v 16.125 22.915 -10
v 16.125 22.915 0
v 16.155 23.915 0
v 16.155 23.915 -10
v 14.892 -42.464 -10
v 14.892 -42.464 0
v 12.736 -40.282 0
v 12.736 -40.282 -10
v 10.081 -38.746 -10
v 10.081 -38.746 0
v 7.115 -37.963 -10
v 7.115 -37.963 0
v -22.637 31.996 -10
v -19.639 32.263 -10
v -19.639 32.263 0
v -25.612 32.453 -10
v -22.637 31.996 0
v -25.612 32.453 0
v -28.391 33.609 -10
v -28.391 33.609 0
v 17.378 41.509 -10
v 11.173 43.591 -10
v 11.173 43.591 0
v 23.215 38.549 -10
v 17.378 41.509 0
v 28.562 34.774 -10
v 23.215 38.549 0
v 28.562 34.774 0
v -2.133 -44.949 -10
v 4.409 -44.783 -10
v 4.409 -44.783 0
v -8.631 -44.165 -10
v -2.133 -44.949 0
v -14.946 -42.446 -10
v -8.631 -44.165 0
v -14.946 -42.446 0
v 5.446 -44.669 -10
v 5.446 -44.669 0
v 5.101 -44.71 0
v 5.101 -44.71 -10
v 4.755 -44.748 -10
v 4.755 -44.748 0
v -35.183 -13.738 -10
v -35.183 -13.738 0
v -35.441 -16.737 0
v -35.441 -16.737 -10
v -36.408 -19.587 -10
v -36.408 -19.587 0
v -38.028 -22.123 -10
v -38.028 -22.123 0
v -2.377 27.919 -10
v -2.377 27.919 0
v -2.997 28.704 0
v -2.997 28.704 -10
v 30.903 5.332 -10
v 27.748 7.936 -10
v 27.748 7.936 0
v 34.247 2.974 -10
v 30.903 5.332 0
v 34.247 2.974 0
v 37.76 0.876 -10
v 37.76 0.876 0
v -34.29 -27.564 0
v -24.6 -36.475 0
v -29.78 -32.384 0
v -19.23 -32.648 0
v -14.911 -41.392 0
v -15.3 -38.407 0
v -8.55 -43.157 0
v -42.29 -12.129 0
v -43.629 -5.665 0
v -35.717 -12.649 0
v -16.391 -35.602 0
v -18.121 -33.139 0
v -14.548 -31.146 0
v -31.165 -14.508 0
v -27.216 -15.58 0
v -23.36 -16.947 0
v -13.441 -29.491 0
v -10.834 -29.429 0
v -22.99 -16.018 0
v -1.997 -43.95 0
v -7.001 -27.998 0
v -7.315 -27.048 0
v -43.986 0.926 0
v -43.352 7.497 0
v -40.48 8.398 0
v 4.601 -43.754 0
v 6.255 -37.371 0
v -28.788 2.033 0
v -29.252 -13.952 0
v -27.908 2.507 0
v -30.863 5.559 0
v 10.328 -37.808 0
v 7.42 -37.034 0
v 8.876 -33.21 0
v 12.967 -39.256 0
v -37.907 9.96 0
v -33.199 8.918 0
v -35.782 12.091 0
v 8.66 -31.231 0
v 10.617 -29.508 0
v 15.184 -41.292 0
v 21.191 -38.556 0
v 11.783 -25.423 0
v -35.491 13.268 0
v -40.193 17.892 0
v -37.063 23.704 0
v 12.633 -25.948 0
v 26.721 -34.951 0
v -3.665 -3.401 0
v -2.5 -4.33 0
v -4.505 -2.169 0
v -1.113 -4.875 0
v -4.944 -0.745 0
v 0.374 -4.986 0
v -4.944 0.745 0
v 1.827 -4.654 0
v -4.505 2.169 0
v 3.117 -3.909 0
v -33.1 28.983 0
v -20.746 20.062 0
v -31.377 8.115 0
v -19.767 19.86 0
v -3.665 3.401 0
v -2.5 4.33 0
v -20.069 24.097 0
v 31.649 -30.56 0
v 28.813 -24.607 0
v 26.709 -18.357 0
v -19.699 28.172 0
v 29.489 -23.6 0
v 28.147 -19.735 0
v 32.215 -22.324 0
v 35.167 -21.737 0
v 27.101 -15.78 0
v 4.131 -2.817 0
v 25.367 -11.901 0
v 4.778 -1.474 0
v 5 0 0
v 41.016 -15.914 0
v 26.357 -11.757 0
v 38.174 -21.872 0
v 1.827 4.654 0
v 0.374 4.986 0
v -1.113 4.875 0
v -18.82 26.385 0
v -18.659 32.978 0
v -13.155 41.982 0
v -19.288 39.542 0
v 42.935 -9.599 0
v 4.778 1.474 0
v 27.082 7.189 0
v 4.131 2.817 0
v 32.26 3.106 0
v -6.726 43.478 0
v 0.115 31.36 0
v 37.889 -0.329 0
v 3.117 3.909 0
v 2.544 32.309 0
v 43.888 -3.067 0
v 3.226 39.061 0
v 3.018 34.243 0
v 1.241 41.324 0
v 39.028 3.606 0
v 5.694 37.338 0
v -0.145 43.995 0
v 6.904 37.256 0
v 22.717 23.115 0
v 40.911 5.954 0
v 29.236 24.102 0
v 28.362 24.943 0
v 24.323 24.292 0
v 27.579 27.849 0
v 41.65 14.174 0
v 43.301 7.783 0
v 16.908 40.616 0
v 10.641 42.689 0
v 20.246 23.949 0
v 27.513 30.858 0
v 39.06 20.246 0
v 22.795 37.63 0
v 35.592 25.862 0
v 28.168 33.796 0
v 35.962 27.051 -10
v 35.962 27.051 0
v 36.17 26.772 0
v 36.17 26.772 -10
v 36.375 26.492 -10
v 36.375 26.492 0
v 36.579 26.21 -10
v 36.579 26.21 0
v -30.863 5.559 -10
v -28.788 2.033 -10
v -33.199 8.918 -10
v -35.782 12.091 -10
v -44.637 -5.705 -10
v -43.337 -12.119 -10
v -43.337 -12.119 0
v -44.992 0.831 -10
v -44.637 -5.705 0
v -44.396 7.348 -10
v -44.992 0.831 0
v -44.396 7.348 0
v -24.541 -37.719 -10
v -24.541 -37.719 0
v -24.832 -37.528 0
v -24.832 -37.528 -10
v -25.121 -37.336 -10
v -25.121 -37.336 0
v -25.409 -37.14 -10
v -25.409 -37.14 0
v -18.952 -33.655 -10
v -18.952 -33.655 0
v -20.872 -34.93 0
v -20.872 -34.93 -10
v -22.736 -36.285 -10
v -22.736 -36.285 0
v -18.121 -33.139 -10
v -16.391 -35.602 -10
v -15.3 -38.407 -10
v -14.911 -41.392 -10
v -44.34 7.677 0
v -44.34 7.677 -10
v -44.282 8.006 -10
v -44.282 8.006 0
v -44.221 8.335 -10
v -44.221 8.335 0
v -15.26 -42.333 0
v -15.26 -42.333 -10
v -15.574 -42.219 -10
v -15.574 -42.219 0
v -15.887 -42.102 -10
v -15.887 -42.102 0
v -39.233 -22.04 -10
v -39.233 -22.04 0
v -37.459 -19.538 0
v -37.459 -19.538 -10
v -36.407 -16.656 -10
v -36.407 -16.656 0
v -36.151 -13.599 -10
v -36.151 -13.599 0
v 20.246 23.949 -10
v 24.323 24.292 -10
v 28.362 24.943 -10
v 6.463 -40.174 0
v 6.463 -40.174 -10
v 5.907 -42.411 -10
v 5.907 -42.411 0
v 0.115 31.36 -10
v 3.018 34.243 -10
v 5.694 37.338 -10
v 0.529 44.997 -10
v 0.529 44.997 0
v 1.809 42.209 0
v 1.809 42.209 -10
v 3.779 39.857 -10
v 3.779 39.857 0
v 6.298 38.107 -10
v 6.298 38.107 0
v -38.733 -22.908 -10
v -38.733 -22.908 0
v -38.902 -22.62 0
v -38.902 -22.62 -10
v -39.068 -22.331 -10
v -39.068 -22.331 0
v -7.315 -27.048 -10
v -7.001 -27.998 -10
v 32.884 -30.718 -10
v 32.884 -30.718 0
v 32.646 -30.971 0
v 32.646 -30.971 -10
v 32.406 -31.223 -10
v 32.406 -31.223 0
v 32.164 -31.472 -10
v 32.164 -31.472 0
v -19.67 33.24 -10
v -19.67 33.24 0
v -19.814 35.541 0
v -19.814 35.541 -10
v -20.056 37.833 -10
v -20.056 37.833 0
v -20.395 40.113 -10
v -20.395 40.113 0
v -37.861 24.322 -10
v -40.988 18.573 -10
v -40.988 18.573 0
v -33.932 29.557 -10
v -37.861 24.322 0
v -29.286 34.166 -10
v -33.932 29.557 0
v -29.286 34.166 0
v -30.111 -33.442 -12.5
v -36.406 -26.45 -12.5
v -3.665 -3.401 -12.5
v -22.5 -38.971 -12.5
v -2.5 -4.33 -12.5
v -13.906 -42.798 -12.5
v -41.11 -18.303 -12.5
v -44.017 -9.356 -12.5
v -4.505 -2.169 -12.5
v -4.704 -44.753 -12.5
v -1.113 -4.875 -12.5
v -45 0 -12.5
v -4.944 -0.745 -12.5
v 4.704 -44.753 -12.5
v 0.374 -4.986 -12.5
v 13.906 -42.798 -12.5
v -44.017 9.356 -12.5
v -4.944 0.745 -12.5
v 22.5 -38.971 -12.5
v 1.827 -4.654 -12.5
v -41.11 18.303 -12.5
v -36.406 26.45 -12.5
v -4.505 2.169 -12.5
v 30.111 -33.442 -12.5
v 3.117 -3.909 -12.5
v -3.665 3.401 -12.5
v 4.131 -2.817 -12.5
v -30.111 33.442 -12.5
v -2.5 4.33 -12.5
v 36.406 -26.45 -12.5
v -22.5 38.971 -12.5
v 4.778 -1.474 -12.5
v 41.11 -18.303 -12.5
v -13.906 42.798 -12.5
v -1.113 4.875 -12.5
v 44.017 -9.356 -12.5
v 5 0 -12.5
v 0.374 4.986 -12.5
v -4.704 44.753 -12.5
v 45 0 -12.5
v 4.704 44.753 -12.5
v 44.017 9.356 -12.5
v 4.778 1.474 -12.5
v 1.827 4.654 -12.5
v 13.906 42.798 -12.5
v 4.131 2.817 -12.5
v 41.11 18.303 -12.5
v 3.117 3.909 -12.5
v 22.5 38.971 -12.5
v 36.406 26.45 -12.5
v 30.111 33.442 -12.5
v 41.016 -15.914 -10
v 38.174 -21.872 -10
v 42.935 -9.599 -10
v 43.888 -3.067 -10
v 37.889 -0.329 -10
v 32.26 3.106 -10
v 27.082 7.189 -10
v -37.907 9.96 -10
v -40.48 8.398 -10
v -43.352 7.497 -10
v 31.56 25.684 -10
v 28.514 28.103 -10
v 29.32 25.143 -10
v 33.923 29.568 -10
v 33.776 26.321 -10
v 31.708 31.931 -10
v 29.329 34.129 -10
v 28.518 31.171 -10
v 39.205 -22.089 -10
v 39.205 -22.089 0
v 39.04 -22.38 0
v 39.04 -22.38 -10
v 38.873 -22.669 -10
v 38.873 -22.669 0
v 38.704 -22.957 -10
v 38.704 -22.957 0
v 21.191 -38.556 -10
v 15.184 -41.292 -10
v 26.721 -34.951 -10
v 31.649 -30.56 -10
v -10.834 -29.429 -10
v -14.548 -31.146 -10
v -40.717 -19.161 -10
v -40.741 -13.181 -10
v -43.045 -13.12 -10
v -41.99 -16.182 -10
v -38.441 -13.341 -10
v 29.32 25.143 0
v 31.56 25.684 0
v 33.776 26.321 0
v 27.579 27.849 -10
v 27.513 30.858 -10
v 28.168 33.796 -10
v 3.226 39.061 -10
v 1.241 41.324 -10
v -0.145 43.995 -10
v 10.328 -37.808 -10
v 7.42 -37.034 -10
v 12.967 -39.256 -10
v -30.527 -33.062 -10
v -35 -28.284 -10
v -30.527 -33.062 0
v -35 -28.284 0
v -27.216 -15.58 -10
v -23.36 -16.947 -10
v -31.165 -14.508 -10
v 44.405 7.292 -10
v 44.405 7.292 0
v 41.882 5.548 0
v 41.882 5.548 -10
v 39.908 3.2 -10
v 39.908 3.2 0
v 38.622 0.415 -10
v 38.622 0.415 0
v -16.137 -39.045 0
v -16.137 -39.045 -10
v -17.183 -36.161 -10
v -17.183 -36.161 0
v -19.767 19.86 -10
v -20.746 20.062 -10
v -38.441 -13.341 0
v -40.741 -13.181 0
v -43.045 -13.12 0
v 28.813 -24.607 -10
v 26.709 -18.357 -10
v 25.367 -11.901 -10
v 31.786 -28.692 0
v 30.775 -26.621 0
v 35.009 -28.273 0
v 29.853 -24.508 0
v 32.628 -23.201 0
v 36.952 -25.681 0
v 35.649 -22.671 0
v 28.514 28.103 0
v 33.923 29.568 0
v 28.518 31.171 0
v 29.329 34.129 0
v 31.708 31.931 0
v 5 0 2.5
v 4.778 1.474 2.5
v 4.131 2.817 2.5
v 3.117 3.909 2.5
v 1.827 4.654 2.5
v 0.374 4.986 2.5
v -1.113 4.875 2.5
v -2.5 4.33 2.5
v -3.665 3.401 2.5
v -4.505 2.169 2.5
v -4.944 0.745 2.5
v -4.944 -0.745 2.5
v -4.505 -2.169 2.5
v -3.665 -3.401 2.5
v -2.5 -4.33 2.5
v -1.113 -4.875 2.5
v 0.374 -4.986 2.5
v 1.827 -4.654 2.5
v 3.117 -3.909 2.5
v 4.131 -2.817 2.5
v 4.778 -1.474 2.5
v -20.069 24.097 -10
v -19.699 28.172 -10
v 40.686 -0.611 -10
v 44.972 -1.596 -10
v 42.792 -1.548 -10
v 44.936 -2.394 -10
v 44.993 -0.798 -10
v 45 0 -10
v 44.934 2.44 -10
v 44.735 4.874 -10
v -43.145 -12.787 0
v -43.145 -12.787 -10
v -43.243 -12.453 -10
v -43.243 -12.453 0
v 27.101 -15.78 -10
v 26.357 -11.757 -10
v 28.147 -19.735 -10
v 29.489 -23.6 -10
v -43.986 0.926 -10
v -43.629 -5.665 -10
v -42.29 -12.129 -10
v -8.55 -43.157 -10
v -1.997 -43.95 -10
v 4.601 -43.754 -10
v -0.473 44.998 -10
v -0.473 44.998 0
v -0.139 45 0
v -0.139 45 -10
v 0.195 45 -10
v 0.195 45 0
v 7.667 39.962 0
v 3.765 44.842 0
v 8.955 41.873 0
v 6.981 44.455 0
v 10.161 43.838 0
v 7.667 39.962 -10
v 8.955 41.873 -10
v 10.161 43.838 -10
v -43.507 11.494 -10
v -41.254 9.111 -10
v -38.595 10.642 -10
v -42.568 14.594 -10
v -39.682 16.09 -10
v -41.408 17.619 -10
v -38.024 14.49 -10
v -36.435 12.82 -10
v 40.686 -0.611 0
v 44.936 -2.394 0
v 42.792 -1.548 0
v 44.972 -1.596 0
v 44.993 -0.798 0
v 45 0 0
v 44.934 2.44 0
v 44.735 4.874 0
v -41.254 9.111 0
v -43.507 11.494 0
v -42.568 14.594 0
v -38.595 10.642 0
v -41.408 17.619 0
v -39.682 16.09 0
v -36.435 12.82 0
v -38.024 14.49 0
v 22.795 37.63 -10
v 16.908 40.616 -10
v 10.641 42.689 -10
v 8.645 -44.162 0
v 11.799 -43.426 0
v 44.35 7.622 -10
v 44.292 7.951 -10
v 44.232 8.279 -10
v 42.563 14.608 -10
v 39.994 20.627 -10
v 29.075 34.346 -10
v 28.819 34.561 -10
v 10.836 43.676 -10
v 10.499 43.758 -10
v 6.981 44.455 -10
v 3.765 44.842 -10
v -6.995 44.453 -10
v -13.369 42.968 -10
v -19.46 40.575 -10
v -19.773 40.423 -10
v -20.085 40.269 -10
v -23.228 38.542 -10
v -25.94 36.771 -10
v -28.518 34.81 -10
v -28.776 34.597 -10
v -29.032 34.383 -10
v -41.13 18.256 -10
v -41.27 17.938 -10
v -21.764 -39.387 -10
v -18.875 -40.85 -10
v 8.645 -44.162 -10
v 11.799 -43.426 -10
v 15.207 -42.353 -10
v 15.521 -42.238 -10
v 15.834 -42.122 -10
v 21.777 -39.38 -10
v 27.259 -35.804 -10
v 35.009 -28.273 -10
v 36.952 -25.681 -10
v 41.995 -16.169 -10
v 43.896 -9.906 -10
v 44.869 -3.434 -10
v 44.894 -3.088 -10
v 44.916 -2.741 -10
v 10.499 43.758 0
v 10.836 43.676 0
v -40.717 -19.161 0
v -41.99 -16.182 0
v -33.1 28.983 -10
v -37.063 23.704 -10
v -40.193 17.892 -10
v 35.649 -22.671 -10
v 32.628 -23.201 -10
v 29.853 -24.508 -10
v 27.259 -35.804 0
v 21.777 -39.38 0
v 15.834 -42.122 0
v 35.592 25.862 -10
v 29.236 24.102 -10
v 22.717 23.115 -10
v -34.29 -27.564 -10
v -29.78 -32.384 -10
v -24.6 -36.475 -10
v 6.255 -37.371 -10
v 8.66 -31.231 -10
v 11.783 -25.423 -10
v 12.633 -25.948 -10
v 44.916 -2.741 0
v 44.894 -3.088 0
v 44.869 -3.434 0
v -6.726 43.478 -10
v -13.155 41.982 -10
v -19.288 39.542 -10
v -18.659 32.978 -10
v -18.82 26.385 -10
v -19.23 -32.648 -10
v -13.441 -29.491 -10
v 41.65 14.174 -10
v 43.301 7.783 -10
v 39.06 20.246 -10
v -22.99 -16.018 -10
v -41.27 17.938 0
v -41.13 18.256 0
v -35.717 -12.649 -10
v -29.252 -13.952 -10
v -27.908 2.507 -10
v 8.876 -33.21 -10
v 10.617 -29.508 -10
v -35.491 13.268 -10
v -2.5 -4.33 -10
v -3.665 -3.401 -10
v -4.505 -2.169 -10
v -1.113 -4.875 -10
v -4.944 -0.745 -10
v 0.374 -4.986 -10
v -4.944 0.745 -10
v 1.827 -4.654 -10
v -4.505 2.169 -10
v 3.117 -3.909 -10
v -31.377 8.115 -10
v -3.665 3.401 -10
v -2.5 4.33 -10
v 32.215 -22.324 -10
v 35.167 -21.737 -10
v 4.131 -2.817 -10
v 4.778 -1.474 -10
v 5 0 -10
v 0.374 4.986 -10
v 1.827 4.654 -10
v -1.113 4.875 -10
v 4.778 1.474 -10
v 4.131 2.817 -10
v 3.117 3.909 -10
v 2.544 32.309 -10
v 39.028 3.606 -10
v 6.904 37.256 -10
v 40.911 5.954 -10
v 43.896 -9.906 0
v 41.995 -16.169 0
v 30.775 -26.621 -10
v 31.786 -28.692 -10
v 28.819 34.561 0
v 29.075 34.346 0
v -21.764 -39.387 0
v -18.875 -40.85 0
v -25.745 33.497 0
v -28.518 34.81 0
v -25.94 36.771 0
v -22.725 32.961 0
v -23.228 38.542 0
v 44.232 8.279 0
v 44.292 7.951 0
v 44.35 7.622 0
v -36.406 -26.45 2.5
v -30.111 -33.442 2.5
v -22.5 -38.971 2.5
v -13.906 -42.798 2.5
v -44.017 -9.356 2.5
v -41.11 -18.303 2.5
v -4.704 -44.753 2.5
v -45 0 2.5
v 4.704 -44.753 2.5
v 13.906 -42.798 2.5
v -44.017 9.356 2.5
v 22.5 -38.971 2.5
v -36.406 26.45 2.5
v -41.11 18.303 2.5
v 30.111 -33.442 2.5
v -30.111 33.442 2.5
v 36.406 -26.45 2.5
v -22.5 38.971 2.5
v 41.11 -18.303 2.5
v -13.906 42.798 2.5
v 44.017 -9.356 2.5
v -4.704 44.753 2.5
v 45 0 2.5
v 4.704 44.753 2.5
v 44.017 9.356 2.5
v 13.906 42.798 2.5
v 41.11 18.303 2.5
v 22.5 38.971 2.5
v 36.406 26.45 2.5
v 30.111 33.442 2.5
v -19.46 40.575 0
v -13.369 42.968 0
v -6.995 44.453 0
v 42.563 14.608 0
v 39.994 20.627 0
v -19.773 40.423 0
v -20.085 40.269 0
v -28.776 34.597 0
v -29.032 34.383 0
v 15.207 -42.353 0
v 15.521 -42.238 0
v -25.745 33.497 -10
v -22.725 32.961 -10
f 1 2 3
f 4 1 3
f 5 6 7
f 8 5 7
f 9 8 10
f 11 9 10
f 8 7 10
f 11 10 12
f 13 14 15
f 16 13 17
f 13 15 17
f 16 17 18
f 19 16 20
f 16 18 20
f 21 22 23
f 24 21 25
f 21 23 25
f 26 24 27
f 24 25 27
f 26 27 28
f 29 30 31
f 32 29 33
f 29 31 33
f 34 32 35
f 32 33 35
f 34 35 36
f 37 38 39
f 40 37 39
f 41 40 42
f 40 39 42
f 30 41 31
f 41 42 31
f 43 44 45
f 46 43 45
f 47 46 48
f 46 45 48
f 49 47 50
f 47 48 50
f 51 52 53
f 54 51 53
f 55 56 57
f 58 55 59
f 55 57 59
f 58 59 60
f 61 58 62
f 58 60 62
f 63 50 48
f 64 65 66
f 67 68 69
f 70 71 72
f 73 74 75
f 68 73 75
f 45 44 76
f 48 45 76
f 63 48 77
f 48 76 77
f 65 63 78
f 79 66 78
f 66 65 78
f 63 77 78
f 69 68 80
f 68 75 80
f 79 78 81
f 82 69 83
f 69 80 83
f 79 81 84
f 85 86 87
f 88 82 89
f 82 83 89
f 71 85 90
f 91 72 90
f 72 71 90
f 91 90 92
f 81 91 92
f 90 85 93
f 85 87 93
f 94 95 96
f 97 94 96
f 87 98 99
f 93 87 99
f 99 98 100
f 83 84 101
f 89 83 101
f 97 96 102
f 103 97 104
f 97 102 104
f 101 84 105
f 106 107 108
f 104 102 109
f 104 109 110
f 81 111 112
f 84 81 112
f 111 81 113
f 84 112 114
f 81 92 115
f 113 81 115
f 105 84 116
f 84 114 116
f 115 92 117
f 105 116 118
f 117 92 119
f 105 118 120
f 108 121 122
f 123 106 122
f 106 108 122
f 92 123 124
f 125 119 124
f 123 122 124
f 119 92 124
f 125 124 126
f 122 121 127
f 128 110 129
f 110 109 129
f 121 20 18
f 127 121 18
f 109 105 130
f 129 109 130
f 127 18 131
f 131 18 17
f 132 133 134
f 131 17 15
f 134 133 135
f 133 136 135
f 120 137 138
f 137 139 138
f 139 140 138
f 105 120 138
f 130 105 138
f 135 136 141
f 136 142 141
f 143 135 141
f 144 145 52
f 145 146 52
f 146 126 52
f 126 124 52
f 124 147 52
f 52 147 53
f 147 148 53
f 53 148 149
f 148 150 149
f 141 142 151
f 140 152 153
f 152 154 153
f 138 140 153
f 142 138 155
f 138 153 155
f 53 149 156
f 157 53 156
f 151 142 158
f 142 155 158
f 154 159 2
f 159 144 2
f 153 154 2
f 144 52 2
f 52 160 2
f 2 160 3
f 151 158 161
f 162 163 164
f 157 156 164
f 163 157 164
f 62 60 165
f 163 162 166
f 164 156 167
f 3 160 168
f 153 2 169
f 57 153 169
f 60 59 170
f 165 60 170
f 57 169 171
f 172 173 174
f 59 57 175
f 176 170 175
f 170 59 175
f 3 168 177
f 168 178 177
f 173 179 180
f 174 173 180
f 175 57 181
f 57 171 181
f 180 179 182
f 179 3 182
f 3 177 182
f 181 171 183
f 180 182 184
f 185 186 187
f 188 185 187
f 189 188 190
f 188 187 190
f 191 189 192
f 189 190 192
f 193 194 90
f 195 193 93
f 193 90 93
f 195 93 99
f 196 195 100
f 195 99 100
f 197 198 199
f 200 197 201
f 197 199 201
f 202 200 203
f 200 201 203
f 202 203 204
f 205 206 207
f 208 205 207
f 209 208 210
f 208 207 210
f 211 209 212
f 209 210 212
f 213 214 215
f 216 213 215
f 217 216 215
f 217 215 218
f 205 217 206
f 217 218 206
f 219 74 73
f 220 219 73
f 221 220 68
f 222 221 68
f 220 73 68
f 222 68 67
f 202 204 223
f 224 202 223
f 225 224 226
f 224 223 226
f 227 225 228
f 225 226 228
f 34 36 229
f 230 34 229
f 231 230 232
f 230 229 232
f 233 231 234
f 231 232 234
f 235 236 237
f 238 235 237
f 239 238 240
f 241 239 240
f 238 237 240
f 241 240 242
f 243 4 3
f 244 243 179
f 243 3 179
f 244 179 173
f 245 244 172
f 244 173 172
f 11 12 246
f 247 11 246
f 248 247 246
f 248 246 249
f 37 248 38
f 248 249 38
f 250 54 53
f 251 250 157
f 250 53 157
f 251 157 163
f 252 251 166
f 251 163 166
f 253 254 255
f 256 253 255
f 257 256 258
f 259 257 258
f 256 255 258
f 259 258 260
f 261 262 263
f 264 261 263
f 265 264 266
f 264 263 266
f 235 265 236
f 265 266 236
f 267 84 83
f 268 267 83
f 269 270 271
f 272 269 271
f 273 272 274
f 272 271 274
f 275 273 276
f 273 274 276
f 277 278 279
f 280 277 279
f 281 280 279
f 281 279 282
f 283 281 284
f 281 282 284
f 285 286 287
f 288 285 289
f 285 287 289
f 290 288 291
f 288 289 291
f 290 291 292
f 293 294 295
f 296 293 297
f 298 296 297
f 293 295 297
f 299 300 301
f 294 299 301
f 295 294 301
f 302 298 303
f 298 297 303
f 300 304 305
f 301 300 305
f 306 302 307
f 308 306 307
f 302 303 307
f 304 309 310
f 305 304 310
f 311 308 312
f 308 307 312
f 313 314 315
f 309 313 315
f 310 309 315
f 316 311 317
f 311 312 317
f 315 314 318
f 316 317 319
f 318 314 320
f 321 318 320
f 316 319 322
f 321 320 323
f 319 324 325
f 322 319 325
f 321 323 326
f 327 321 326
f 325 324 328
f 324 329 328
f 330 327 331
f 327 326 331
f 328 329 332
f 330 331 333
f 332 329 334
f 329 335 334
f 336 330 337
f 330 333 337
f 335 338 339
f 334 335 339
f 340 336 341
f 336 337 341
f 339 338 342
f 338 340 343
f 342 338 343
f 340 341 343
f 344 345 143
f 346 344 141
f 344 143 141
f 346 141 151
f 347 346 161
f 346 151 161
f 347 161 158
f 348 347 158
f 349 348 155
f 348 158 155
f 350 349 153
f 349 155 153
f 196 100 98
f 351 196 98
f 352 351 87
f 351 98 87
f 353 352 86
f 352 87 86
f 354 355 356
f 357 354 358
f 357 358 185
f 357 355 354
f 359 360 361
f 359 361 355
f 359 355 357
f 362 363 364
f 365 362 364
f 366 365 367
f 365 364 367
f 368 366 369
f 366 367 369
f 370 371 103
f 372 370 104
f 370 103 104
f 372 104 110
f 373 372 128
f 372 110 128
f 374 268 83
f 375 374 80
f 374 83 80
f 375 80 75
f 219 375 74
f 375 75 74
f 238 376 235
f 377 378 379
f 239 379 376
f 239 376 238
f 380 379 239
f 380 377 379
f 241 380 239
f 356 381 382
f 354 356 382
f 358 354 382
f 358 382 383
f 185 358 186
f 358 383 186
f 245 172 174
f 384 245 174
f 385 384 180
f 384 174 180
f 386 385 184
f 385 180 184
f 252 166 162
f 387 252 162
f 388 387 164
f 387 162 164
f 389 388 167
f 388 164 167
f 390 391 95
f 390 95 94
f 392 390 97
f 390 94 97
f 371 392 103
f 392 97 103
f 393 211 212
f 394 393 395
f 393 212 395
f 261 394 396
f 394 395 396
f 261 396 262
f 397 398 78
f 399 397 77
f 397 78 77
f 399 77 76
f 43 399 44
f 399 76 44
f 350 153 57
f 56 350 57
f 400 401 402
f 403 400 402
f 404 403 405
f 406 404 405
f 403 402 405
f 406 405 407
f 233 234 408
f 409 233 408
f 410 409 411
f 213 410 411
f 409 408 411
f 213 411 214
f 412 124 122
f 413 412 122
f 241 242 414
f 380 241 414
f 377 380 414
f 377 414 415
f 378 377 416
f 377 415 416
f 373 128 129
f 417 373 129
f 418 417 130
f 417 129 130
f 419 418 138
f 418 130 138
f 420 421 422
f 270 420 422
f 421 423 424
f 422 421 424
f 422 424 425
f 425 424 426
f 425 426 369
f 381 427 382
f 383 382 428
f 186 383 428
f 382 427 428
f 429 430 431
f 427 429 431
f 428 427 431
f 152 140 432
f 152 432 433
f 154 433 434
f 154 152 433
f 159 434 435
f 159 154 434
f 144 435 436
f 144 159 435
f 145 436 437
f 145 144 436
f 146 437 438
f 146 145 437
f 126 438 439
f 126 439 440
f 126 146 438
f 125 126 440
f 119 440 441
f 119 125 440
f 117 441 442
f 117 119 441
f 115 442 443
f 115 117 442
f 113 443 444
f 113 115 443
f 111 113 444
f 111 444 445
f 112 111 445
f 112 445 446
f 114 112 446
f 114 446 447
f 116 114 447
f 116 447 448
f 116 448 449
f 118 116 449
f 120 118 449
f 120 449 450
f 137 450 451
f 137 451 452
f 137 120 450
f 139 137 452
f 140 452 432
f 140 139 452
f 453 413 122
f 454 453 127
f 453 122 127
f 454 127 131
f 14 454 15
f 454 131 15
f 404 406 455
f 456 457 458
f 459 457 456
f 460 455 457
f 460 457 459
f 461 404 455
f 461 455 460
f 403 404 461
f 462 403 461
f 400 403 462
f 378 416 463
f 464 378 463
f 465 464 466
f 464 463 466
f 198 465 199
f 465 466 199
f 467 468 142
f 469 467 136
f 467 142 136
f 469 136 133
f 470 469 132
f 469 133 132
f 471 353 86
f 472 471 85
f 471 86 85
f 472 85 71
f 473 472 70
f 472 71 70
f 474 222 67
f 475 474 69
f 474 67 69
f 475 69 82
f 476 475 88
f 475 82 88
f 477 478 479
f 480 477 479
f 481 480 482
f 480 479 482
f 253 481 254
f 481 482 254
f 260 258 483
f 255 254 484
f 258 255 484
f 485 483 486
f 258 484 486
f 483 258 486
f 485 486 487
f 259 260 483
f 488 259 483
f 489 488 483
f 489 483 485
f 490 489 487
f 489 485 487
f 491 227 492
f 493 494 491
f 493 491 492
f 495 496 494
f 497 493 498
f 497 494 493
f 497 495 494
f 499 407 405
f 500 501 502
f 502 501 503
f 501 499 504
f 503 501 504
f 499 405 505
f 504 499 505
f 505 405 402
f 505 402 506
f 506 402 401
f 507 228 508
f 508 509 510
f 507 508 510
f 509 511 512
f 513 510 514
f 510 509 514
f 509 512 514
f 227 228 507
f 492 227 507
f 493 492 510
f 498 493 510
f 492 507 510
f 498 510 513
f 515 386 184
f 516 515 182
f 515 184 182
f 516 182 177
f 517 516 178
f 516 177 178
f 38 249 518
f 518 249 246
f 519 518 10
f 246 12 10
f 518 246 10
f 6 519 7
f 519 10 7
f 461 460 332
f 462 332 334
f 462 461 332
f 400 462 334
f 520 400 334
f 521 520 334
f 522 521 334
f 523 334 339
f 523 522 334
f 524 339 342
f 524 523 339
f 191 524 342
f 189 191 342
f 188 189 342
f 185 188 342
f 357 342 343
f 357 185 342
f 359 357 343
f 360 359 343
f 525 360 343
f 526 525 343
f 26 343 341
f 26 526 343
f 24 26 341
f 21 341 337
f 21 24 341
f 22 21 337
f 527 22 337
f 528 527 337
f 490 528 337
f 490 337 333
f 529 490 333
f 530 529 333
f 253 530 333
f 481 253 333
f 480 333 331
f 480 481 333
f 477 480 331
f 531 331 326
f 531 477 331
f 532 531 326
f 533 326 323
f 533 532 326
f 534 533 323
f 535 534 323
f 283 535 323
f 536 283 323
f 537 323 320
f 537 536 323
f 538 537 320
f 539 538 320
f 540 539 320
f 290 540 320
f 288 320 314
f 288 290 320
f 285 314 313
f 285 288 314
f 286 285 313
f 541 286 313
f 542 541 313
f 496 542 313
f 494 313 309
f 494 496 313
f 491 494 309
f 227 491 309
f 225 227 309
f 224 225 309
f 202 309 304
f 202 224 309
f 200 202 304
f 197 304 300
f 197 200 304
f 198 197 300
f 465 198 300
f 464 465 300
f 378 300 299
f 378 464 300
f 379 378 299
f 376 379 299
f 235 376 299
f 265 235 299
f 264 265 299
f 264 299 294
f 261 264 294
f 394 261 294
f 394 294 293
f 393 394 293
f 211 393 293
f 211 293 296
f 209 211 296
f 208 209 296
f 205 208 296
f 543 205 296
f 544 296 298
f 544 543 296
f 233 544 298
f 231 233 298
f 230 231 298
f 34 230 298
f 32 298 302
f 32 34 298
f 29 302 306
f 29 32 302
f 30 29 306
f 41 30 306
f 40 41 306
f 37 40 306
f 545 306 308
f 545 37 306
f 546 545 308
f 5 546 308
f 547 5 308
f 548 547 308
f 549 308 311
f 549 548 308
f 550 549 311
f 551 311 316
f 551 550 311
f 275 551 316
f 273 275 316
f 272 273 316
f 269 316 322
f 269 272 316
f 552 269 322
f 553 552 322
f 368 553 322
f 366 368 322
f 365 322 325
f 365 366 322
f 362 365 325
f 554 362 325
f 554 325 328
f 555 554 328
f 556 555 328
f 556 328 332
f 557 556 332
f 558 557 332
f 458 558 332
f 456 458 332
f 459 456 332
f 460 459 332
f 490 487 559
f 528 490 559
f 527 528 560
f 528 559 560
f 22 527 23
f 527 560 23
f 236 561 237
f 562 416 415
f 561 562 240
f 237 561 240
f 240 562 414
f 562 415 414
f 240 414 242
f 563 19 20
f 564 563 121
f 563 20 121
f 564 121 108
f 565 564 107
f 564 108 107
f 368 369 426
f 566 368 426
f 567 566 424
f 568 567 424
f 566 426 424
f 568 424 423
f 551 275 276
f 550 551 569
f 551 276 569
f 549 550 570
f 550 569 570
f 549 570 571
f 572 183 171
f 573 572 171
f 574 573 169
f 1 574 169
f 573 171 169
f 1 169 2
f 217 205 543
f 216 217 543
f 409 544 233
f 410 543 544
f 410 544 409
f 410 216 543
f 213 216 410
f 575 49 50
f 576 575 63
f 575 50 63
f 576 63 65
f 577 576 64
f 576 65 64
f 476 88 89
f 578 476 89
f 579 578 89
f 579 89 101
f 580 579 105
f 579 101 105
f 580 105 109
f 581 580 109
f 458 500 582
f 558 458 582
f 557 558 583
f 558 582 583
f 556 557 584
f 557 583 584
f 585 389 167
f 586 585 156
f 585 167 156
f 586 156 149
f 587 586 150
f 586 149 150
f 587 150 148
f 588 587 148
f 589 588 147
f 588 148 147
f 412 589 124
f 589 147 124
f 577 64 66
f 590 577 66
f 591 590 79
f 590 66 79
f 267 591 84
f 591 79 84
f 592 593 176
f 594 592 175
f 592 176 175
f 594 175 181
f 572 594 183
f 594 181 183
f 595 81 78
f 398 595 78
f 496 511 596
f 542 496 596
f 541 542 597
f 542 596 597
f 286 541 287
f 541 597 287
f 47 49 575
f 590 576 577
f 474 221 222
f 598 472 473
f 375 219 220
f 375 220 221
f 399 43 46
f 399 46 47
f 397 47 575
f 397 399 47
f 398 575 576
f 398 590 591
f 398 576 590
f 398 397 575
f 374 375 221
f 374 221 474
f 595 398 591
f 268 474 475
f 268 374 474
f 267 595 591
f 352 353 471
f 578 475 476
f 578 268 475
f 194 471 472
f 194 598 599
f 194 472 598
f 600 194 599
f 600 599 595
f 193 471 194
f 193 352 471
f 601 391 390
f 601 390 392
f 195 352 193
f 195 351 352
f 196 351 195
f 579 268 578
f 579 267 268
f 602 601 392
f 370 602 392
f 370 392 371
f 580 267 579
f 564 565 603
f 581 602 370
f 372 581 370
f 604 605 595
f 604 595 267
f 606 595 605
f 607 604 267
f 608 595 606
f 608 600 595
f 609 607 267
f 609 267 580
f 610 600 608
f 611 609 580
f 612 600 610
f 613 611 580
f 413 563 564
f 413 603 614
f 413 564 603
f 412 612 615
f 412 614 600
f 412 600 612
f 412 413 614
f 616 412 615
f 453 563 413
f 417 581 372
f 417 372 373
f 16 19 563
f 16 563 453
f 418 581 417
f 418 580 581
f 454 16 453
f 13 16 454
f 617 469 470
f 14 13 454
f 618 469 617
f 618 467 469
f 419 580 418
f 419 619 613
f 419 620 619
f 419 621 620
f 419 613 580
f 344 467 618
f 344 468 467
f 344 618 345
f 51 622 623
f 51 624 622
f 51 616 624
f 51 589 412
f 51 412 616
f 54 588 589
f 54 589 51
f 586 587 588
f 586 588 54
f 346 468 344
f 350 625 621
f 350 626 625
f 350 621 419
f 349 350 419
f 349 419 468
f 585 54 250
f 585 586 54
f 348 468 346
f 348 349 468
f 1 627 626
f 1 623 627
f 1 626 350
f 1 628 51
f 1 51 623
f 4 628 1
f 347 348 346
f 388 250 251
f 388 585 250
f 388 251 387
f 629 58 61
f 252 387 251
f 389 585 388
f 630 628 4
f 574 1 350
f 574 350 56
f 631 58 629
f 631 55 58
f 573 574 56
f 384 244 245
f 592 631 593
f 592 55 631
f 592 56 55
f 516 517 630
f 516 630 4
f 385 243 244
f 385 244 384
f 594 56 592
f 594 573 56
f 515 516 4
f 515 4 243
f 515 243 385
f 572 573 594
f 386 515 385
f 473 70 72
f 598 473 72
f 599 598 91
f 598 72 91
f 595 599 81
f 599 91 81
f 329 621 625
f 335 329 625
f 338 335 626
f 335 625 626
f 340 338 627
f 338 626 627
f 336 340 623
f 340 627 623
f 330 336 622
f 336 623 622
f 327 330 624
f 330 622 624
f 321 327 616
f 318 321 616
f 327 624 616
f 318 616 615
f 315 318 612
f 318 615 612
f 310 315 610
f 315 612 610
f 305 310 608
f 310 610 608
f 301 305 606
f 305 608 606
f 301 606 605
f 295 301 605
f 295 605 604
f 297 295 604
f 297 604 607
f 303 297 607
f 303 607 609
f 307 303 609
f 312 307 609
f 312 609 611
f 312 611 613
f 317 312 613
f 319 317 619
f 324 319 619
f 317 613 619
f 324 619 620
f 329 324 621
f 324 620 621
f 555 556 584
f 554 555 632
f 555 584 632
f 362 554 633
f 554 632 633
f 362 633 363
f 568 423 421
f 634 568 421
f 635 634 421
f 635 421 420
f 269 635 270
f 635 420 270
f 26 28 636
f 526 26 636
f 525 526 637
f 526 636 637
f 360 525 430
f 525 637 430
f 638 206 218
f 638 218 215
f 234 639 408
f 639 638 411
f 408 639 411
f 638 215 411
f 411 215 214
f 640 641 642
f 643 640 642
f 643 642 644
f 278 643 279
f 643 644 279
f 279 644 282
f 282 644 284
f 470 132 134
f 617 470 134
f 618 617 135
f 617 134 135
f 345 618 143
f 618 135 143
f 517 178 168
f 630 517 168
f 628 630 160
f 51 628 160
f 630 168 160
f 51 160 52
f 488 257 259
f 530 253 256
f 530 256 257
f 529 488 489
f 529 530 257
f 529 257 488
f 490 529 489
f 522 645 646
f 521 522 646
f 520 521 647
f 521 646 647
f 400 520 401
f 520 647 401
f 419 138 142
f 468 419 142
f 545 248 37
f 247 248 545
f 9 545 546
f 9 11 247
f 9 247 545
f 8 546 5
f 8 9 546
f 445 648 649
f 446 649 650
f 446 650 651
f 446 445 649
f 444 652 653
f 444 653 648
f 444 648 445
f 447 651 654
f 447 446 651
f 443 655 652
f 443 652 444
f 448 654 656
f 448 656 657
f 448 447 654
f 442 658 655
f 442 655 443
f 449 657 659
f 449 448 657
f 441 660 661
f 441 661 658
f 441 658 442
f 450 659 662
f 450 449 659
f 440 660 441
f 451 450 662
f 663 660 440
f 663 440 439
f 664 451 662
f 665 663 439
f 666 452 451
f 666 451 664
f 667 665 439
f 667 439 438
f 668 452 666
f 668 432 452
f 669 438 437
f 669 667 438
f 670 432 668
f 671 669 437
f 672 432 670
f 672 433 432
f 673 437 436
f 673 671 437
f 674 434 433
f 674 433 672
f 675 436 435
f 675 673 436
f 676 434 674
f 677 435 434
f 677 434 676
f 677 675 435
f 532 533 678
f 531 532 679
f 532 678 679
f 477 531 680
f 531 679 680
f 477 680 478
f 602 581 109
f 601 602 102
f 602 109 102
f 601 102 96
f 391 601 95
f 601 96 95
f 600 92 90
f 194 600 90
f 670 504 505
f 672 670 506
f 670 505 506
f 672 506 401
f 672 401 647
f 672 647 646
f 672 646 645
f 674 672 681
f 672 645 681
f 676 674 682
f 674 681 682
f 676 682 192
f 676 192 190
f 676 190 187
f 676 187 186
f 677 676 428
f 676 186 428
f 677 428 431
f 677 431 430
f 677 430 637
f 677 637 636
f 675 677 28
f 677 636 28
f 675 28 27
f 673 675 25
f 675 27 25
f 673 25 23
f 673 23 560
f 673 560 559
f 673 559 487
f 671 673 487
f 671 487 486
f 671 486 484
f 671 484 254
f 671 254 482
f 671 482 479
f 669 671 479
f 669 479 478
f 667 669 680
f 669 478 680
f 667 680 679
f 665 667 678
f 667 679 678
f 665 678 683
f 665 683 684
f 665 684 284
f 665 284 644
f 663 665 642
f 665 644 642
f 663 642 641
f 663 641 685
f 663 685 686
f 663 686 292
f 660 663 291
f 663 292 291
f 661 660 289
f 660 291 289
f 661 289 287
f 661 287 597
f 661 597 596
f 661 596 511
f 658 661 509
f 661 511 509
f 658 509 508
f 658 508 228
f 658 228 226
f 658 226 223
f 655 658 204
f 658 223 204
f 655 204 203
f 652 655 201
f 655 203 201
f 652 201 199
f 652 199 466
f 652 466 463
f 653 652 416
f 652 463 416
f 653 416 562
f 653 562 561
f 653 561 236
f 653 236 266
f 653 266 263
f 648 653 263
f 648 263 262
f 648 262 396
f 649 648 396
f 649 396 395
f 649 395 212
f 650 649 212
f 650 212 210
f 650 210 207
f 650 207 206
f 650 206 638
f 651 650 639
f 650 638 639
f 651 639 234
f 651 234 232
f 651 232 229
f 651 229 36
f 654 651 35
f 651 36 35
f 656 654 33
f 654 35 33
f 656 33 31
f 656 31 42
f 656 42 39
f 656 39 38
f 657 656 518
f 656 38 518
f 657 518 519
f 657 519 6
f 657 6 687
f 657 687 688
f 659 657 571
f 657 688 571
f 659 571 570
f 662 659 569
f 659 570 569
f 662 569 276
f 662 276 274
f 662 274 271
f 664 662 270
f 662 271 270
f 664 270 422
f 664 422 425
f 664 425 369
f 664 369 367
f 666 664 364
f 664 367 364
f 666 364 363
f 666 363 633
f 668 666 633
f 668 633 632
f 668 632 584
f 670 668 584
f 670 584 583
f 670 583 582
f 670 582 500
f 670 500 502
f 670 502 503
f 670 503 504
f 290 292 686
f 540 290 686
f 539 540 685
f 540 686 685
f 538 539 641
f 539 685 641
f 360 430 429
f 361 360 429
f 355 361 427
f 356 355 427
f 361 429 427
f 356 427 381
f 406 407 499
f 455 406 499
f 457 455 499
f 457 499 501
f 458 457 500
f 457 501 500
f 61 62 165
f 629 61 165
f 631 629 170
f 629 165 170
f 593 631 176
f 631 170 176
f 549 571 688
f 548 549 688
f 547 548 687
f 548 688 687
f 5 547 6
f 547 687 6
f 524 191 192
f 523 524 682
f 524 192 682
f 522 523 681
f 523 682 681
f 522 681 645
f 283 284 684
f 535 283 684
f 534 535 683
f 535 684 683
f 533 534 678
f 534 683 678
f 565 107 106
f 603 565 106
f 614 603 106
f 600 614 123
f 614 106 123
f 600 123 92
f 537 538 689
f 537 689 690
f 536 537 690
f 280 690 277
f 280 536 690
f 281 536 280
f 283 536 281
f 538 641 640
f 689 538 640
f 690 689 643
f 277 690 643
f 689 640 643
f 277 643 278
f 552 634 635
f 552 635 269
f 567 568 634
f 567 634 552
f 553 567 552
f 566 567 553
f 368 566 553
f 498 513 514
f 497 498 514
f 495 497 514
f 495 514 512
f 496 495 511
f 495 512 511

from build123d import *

# Parameters (mm, degrees)
SKETCH1_R           = 45
SKETCH1_R_2         = 5
BOSS_EXTRUDE1_DEPTH = 2.5
BOSS_EXTRUDE2_DEPTH = 10
CIRPATTERN3_COUNT   = 9
BOSS_EXTRUDE6_DEPTH = 10
CIRPATTERN4_COUNT   = 9


with BuildPart() as part:
    # Sketch1 → Boss-Extrude1 (new body)
    with BuildSketch(Plane.XY):
        Circle(SKETCH1_R)
        Circle(SKETCH1_R_2, mode=Mode.SUBTRACT)
    boss_extrude1 = extrude(amount=BOSS_EXTRUDE1_DEPTH)

    # Sketch2 → Boss-Extrude2 (add)
    with BuildSketch(Plane(origin=(0, 0, 0), x_dir=(-1, 0, 0), z_dir=(0, 0, -1))):
        with BuildLine():
            Line((2.376945651, 27.919273565), (2.996801322, 28.703989404))
            ThreePointArc((2.996801322, 28.703989404), (-1.593989447, 32.774038165), (-5.693957299, 37.338128482))
            ThreePointArc((-5.693957299, 37.338128482), (-1.825718804, 40.535941838), (0.472898867, 44.997515117))
            ThreePointArc((0.472898867, 44.997515117), (-0.028187178, 44.999991172), (-0.529269728, 44.996887376))
            ThreePointArc((-0.529269728, 44.996887376), (-2.71555077, 40.967370456), (-6.298348731, 38.107232317))
            ThreePointArc((-6.298348731, 38.107232317), (-8.321118794, 40.910790025), (-10.160523263, 43.837926126))
            ThreePointArc((-10.160523263, 43.837926126), (-10.667701719, 43.717275076), (-11.173448403, 43.590756483))
            ThreePointArc((-11.173448403, 43.590756483), (-5.142118978, 35.111827702), (2.376945651, 27.919273565))
        make_face()
    boss_extrude2 = extrude(amount=BOSS_EXTRUDE2_DEPTH)

    # CirPattern3: Boss-Extrude2 ×9 about axis
    cirpattern3_axis = Axis((0, 0, 0), (0, 0, 1))
    for i in range(1, CIRPATTERN3_COUNT):
        add(boss_extrude2.rotate(cirpattern3_axis, i * 360 / CIRPATTERN3_COUNT))

    # Sketch3 → Boss-Extrude6 (add)
    with BuildSketch(Plane(origin=(0, 0, 0), x_dir=(-1, 0, 0), z_dir=(0, 0, -1))):
        with BuildLine():
            ThreePointArc((0.145366303, 43.995082638), (9.96868345, 42.851065074), (19.288277599, 39.541759887))
            ThreePointArc((19.288277599, 39.541759887), (19.371803139, 40.058594285), (19.460240105, 40.574610966))
            ThreePointArc((19.460240105, 40.574610966), (10.208967999, 43.826669648), (0.472898867, 44.997515117))
            ThreePointArc((0.472898867, 44.997515117), (0.31970879, 44.492843232), (0.145366303, 43.995082638))
        make_face()
    boss_extrude6 = extrude(amount=BOSS_EXTRUDE6_DEPTH)

    # CirPattern4: Boss-Extrude6 ×9 about axis
    cirpattern4_axis = Axis((0, 0, 2.5), (0, 0, -1))
    for i in range(1, CIRPATTERN4_COUNT):
        add(boss_extrude6.rotate(cirpattern4_axis, i * 360 / CIRPATTERN4_COUNT))

    # Mirror3: Boss-Extrude1 across plane
    add(boss_extrude1.mirror(Plane.XY.offset(-5)))


solid = part.part
